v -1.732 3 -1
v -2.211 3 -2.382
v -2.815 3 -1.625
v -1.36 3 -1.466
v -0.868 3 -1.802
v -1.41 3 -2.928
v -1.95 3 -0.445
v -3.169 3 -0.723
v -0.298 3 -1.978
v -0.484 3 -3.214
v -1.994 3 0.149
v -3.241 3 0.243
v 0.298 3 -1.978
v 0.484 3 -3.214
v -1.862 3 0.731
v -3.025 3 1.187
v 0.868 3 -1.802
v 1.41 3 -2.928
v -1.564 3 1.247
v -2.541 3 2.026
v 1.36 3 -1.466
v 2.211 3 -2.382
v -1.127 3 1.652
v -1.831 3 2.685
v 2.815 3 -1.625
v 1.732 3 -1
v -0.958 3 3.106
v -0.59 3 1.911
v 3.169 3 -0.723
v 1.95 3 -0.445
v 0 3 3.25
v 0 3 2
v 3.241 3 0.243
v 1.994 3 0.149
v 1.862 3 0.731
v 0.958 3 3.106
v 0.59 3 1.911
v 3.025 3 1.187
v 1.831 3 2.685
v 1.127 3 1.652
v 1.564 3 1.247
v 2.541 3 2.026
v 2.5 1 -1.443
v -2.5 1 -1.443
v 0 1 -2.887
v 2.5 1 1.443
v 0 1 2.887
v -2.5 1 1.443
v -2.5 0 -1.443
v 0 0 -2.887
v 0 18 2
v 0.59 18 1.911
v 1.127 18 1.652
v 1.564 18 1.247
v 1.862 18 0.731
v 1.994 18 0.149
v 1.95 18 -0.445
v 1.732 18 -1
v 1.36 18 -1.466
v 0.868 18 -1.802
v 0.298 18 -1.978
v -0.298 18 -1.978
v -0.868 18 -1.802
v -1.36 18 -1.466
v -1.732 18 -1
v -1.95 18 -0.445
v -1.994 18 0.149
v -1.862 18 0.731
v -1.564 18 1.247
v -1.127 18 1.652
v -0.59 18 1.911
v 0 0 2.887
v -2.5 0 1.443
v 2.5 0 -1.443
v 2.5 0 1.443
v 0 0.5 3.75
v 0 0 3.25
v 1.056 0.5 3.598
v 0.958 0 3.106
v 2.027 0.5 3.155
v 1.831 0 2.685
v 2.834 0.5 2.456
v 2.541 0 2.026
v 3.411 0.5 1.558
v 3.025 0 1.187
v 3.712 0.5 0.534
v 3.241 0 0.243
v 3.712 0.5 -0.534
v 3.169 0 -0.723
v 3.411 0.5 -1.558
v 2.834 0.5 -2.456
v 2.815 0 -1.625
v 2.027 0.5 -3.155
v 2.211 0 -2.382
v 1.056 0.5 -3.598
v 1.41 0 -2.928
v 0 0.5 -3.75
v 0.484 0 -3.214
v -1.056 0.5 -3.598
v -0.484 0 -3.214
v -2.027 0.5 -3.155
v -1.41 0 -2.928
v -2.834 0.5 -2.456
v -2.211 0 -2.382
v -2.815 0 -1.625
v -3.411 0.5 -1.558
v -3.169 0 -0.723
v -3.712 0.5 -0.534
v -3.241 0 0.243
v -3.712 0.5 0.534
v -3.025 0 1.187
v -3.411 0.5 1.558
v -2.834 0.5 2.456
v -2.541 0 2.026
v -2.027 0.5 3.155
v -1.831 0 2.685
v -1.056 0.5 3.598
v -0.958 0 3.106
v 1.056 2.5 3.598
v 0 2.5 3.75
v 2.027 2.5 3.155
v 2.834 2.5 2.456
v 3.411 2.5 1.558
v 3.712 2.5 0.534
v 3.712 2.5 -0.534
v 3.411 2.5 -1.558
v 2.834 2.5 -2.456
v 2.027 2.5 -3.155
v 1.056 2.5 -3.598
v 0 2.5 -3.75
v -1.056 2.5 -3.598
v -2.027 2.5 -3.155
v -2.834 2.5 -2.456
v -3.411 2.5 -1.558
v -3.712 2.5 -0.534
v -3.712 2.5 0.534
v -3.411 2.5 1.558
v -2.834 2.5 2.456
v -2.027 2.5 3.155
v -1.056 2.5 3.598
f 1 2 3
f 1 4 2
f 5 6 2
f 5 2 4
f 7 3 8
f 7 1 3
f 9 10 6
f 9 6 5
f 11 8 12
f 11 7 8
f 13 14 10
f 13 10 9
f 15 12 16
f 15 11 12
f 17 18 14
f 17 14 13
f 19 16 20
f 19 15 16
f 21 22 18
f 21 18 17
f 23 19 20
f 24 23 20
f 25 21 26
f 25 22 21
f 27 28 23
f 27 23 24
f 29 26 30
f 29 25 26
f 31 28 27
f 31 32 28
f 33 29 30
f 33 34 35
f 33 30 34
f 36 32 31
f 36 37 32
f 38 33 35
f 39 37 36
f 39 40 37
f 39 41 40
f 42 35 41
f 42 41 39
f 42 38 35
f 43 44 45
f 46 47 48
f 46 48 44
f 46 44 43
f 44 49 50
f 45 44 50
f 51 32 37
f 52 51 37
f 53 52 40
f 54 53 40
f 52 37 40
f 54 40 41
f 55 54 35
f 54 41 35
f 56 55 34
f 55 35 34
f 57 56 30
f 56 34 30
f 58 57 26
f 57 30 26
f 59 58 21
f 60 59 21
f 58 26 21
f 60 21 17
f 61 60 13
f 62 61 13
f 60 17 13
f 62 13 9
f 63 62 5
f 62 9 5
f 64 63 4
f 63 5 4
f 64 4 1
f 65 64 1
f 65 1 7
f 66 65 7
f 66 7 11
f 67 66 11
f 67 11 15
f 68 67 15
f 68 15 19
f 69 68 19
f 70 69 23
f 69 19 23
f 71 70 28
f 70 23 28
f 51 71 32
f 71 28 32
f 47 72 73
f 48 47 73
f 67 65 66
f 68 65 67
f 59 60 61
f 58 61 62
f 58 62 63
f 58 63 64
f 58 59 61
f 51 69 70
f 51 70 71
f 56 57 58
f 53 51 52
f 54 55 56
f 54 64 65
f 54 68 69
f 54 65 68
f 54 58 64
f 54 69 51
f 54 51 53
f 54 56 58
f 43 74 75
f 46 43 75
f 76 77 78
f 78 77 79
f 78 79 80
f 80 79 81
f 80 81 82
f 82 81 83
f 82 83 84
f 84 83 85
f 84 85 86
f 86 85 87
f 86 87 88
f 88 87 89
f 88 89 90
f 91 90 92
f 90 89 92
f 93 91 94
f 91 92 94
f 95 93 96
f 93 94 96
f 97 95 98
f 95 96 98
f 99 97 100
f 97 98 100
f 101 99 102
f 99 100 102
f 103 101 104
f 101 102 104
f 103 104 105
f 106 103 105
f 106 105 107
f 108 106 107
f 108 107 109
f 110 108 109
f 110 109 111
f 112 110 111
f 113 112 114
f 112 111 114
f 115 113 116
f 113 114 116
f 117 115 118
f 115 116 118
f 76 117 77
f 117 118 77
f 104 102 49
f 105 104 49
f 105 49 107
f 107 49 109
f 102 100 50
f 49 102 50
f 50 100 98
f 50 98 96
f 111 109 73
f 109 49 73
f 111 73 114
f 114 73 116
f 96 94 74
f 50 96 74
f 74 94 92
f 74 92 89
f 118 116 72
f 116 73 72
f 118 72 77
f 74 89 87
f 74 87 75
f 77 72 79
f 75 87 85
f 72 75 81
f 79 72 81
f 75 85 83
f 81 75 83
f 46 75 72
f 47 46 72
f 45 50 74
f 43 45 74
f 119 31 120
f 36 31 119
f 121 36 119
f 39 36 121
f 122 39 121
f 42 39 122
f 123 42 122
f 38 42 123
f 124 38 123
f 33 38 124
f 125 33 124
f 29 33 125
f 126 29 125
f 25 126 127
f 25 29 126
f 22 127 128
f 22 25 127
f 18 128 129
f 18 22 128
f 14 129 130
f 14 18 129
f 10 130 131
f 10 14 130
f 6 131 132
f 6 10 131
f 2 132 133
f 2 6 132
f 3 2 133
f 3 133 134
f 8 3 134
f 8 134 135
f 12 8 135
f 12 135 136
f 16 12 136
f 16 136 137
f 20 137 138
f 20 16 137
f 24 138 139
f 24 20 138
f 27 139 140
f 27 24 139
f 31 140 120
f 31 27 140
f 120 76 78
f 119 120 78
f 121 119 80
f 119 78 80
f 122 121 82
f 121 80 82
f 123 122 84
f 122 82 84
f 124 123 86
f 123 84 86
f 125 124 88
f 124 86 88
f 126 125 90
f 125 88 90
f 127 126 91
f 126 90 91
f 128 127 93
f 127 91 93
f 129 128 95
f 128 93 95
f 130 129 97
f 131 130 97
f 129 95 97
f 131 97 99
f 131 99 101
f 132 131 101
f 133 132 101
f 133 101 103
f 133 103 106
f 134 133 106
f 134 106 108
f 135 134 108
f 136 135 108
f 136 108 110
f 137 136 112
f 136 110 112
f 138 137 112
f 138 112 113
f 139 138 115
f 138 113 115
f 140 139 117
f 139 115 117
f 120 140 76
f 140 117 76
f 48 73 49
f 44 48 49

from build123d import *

# Parameters (mm, degrees)
SKETCH_1_R          = 3.75
EXTRUDE_1_DEPTH     = 3
SKETCH_2_R          = 2
EXTRUDE_2_DEPTH     = 15
CHAMFER_1_SIZE      = 0.5
CUT_EXTRUDE_1_DEPTH = 1


with BuildPart() as part:
    # 草图1 → 凸台-拉伸1 (new body)
    with BuildSketch(Plane(origin=(0, 0, 0), x_dir=(1, 0, 0), z_dir=(0, 1, 0))):
        with Locations(Location((0, 0, 0), (0, 0, 270))):
            Circle(SKETCH_1_R)
    extrude(amount=EXTRUDE_1_DEPTH)

    # 草图2 → 凸台-拉伸2 (add)
    with BuildSketch(Plane(origin=(0, 3, 0), x_dir=(1, 0, 0), z_dir=(0, 1, 0))):
        with Locations(Location((0, 0, 0), (0, 0, 270))):
            Circle(SKETCH_2_R)
    extrude(amount=EXTRUDE_2_DEPTH)

    # 倒角1
    chamfer_1_edges = [part.edges().sort_by_distance(p)[0] for p in [
        (0, 0, -3.75),
        (0, 3, -3.75),
    ]]
    chamfer(chamfer_1_edges, length=CHAMFER_1_SIZE)

    # 草图3 → 切除-拉伸1 (cut)
    with BuildSketch(Plane.XZ):
        Polygon((0, -2.886751346), (2.5, -1.443375673), (2.5, 1.443375673), (0, 2.886751346), (-2.5, 1.443375673), (-2.5, -1.443375673), align=None)
    extrude(amount=-CUT_EXTRUDE_1_DEPTH, mode=Mode.SUBTRACT)


solid = part.part
